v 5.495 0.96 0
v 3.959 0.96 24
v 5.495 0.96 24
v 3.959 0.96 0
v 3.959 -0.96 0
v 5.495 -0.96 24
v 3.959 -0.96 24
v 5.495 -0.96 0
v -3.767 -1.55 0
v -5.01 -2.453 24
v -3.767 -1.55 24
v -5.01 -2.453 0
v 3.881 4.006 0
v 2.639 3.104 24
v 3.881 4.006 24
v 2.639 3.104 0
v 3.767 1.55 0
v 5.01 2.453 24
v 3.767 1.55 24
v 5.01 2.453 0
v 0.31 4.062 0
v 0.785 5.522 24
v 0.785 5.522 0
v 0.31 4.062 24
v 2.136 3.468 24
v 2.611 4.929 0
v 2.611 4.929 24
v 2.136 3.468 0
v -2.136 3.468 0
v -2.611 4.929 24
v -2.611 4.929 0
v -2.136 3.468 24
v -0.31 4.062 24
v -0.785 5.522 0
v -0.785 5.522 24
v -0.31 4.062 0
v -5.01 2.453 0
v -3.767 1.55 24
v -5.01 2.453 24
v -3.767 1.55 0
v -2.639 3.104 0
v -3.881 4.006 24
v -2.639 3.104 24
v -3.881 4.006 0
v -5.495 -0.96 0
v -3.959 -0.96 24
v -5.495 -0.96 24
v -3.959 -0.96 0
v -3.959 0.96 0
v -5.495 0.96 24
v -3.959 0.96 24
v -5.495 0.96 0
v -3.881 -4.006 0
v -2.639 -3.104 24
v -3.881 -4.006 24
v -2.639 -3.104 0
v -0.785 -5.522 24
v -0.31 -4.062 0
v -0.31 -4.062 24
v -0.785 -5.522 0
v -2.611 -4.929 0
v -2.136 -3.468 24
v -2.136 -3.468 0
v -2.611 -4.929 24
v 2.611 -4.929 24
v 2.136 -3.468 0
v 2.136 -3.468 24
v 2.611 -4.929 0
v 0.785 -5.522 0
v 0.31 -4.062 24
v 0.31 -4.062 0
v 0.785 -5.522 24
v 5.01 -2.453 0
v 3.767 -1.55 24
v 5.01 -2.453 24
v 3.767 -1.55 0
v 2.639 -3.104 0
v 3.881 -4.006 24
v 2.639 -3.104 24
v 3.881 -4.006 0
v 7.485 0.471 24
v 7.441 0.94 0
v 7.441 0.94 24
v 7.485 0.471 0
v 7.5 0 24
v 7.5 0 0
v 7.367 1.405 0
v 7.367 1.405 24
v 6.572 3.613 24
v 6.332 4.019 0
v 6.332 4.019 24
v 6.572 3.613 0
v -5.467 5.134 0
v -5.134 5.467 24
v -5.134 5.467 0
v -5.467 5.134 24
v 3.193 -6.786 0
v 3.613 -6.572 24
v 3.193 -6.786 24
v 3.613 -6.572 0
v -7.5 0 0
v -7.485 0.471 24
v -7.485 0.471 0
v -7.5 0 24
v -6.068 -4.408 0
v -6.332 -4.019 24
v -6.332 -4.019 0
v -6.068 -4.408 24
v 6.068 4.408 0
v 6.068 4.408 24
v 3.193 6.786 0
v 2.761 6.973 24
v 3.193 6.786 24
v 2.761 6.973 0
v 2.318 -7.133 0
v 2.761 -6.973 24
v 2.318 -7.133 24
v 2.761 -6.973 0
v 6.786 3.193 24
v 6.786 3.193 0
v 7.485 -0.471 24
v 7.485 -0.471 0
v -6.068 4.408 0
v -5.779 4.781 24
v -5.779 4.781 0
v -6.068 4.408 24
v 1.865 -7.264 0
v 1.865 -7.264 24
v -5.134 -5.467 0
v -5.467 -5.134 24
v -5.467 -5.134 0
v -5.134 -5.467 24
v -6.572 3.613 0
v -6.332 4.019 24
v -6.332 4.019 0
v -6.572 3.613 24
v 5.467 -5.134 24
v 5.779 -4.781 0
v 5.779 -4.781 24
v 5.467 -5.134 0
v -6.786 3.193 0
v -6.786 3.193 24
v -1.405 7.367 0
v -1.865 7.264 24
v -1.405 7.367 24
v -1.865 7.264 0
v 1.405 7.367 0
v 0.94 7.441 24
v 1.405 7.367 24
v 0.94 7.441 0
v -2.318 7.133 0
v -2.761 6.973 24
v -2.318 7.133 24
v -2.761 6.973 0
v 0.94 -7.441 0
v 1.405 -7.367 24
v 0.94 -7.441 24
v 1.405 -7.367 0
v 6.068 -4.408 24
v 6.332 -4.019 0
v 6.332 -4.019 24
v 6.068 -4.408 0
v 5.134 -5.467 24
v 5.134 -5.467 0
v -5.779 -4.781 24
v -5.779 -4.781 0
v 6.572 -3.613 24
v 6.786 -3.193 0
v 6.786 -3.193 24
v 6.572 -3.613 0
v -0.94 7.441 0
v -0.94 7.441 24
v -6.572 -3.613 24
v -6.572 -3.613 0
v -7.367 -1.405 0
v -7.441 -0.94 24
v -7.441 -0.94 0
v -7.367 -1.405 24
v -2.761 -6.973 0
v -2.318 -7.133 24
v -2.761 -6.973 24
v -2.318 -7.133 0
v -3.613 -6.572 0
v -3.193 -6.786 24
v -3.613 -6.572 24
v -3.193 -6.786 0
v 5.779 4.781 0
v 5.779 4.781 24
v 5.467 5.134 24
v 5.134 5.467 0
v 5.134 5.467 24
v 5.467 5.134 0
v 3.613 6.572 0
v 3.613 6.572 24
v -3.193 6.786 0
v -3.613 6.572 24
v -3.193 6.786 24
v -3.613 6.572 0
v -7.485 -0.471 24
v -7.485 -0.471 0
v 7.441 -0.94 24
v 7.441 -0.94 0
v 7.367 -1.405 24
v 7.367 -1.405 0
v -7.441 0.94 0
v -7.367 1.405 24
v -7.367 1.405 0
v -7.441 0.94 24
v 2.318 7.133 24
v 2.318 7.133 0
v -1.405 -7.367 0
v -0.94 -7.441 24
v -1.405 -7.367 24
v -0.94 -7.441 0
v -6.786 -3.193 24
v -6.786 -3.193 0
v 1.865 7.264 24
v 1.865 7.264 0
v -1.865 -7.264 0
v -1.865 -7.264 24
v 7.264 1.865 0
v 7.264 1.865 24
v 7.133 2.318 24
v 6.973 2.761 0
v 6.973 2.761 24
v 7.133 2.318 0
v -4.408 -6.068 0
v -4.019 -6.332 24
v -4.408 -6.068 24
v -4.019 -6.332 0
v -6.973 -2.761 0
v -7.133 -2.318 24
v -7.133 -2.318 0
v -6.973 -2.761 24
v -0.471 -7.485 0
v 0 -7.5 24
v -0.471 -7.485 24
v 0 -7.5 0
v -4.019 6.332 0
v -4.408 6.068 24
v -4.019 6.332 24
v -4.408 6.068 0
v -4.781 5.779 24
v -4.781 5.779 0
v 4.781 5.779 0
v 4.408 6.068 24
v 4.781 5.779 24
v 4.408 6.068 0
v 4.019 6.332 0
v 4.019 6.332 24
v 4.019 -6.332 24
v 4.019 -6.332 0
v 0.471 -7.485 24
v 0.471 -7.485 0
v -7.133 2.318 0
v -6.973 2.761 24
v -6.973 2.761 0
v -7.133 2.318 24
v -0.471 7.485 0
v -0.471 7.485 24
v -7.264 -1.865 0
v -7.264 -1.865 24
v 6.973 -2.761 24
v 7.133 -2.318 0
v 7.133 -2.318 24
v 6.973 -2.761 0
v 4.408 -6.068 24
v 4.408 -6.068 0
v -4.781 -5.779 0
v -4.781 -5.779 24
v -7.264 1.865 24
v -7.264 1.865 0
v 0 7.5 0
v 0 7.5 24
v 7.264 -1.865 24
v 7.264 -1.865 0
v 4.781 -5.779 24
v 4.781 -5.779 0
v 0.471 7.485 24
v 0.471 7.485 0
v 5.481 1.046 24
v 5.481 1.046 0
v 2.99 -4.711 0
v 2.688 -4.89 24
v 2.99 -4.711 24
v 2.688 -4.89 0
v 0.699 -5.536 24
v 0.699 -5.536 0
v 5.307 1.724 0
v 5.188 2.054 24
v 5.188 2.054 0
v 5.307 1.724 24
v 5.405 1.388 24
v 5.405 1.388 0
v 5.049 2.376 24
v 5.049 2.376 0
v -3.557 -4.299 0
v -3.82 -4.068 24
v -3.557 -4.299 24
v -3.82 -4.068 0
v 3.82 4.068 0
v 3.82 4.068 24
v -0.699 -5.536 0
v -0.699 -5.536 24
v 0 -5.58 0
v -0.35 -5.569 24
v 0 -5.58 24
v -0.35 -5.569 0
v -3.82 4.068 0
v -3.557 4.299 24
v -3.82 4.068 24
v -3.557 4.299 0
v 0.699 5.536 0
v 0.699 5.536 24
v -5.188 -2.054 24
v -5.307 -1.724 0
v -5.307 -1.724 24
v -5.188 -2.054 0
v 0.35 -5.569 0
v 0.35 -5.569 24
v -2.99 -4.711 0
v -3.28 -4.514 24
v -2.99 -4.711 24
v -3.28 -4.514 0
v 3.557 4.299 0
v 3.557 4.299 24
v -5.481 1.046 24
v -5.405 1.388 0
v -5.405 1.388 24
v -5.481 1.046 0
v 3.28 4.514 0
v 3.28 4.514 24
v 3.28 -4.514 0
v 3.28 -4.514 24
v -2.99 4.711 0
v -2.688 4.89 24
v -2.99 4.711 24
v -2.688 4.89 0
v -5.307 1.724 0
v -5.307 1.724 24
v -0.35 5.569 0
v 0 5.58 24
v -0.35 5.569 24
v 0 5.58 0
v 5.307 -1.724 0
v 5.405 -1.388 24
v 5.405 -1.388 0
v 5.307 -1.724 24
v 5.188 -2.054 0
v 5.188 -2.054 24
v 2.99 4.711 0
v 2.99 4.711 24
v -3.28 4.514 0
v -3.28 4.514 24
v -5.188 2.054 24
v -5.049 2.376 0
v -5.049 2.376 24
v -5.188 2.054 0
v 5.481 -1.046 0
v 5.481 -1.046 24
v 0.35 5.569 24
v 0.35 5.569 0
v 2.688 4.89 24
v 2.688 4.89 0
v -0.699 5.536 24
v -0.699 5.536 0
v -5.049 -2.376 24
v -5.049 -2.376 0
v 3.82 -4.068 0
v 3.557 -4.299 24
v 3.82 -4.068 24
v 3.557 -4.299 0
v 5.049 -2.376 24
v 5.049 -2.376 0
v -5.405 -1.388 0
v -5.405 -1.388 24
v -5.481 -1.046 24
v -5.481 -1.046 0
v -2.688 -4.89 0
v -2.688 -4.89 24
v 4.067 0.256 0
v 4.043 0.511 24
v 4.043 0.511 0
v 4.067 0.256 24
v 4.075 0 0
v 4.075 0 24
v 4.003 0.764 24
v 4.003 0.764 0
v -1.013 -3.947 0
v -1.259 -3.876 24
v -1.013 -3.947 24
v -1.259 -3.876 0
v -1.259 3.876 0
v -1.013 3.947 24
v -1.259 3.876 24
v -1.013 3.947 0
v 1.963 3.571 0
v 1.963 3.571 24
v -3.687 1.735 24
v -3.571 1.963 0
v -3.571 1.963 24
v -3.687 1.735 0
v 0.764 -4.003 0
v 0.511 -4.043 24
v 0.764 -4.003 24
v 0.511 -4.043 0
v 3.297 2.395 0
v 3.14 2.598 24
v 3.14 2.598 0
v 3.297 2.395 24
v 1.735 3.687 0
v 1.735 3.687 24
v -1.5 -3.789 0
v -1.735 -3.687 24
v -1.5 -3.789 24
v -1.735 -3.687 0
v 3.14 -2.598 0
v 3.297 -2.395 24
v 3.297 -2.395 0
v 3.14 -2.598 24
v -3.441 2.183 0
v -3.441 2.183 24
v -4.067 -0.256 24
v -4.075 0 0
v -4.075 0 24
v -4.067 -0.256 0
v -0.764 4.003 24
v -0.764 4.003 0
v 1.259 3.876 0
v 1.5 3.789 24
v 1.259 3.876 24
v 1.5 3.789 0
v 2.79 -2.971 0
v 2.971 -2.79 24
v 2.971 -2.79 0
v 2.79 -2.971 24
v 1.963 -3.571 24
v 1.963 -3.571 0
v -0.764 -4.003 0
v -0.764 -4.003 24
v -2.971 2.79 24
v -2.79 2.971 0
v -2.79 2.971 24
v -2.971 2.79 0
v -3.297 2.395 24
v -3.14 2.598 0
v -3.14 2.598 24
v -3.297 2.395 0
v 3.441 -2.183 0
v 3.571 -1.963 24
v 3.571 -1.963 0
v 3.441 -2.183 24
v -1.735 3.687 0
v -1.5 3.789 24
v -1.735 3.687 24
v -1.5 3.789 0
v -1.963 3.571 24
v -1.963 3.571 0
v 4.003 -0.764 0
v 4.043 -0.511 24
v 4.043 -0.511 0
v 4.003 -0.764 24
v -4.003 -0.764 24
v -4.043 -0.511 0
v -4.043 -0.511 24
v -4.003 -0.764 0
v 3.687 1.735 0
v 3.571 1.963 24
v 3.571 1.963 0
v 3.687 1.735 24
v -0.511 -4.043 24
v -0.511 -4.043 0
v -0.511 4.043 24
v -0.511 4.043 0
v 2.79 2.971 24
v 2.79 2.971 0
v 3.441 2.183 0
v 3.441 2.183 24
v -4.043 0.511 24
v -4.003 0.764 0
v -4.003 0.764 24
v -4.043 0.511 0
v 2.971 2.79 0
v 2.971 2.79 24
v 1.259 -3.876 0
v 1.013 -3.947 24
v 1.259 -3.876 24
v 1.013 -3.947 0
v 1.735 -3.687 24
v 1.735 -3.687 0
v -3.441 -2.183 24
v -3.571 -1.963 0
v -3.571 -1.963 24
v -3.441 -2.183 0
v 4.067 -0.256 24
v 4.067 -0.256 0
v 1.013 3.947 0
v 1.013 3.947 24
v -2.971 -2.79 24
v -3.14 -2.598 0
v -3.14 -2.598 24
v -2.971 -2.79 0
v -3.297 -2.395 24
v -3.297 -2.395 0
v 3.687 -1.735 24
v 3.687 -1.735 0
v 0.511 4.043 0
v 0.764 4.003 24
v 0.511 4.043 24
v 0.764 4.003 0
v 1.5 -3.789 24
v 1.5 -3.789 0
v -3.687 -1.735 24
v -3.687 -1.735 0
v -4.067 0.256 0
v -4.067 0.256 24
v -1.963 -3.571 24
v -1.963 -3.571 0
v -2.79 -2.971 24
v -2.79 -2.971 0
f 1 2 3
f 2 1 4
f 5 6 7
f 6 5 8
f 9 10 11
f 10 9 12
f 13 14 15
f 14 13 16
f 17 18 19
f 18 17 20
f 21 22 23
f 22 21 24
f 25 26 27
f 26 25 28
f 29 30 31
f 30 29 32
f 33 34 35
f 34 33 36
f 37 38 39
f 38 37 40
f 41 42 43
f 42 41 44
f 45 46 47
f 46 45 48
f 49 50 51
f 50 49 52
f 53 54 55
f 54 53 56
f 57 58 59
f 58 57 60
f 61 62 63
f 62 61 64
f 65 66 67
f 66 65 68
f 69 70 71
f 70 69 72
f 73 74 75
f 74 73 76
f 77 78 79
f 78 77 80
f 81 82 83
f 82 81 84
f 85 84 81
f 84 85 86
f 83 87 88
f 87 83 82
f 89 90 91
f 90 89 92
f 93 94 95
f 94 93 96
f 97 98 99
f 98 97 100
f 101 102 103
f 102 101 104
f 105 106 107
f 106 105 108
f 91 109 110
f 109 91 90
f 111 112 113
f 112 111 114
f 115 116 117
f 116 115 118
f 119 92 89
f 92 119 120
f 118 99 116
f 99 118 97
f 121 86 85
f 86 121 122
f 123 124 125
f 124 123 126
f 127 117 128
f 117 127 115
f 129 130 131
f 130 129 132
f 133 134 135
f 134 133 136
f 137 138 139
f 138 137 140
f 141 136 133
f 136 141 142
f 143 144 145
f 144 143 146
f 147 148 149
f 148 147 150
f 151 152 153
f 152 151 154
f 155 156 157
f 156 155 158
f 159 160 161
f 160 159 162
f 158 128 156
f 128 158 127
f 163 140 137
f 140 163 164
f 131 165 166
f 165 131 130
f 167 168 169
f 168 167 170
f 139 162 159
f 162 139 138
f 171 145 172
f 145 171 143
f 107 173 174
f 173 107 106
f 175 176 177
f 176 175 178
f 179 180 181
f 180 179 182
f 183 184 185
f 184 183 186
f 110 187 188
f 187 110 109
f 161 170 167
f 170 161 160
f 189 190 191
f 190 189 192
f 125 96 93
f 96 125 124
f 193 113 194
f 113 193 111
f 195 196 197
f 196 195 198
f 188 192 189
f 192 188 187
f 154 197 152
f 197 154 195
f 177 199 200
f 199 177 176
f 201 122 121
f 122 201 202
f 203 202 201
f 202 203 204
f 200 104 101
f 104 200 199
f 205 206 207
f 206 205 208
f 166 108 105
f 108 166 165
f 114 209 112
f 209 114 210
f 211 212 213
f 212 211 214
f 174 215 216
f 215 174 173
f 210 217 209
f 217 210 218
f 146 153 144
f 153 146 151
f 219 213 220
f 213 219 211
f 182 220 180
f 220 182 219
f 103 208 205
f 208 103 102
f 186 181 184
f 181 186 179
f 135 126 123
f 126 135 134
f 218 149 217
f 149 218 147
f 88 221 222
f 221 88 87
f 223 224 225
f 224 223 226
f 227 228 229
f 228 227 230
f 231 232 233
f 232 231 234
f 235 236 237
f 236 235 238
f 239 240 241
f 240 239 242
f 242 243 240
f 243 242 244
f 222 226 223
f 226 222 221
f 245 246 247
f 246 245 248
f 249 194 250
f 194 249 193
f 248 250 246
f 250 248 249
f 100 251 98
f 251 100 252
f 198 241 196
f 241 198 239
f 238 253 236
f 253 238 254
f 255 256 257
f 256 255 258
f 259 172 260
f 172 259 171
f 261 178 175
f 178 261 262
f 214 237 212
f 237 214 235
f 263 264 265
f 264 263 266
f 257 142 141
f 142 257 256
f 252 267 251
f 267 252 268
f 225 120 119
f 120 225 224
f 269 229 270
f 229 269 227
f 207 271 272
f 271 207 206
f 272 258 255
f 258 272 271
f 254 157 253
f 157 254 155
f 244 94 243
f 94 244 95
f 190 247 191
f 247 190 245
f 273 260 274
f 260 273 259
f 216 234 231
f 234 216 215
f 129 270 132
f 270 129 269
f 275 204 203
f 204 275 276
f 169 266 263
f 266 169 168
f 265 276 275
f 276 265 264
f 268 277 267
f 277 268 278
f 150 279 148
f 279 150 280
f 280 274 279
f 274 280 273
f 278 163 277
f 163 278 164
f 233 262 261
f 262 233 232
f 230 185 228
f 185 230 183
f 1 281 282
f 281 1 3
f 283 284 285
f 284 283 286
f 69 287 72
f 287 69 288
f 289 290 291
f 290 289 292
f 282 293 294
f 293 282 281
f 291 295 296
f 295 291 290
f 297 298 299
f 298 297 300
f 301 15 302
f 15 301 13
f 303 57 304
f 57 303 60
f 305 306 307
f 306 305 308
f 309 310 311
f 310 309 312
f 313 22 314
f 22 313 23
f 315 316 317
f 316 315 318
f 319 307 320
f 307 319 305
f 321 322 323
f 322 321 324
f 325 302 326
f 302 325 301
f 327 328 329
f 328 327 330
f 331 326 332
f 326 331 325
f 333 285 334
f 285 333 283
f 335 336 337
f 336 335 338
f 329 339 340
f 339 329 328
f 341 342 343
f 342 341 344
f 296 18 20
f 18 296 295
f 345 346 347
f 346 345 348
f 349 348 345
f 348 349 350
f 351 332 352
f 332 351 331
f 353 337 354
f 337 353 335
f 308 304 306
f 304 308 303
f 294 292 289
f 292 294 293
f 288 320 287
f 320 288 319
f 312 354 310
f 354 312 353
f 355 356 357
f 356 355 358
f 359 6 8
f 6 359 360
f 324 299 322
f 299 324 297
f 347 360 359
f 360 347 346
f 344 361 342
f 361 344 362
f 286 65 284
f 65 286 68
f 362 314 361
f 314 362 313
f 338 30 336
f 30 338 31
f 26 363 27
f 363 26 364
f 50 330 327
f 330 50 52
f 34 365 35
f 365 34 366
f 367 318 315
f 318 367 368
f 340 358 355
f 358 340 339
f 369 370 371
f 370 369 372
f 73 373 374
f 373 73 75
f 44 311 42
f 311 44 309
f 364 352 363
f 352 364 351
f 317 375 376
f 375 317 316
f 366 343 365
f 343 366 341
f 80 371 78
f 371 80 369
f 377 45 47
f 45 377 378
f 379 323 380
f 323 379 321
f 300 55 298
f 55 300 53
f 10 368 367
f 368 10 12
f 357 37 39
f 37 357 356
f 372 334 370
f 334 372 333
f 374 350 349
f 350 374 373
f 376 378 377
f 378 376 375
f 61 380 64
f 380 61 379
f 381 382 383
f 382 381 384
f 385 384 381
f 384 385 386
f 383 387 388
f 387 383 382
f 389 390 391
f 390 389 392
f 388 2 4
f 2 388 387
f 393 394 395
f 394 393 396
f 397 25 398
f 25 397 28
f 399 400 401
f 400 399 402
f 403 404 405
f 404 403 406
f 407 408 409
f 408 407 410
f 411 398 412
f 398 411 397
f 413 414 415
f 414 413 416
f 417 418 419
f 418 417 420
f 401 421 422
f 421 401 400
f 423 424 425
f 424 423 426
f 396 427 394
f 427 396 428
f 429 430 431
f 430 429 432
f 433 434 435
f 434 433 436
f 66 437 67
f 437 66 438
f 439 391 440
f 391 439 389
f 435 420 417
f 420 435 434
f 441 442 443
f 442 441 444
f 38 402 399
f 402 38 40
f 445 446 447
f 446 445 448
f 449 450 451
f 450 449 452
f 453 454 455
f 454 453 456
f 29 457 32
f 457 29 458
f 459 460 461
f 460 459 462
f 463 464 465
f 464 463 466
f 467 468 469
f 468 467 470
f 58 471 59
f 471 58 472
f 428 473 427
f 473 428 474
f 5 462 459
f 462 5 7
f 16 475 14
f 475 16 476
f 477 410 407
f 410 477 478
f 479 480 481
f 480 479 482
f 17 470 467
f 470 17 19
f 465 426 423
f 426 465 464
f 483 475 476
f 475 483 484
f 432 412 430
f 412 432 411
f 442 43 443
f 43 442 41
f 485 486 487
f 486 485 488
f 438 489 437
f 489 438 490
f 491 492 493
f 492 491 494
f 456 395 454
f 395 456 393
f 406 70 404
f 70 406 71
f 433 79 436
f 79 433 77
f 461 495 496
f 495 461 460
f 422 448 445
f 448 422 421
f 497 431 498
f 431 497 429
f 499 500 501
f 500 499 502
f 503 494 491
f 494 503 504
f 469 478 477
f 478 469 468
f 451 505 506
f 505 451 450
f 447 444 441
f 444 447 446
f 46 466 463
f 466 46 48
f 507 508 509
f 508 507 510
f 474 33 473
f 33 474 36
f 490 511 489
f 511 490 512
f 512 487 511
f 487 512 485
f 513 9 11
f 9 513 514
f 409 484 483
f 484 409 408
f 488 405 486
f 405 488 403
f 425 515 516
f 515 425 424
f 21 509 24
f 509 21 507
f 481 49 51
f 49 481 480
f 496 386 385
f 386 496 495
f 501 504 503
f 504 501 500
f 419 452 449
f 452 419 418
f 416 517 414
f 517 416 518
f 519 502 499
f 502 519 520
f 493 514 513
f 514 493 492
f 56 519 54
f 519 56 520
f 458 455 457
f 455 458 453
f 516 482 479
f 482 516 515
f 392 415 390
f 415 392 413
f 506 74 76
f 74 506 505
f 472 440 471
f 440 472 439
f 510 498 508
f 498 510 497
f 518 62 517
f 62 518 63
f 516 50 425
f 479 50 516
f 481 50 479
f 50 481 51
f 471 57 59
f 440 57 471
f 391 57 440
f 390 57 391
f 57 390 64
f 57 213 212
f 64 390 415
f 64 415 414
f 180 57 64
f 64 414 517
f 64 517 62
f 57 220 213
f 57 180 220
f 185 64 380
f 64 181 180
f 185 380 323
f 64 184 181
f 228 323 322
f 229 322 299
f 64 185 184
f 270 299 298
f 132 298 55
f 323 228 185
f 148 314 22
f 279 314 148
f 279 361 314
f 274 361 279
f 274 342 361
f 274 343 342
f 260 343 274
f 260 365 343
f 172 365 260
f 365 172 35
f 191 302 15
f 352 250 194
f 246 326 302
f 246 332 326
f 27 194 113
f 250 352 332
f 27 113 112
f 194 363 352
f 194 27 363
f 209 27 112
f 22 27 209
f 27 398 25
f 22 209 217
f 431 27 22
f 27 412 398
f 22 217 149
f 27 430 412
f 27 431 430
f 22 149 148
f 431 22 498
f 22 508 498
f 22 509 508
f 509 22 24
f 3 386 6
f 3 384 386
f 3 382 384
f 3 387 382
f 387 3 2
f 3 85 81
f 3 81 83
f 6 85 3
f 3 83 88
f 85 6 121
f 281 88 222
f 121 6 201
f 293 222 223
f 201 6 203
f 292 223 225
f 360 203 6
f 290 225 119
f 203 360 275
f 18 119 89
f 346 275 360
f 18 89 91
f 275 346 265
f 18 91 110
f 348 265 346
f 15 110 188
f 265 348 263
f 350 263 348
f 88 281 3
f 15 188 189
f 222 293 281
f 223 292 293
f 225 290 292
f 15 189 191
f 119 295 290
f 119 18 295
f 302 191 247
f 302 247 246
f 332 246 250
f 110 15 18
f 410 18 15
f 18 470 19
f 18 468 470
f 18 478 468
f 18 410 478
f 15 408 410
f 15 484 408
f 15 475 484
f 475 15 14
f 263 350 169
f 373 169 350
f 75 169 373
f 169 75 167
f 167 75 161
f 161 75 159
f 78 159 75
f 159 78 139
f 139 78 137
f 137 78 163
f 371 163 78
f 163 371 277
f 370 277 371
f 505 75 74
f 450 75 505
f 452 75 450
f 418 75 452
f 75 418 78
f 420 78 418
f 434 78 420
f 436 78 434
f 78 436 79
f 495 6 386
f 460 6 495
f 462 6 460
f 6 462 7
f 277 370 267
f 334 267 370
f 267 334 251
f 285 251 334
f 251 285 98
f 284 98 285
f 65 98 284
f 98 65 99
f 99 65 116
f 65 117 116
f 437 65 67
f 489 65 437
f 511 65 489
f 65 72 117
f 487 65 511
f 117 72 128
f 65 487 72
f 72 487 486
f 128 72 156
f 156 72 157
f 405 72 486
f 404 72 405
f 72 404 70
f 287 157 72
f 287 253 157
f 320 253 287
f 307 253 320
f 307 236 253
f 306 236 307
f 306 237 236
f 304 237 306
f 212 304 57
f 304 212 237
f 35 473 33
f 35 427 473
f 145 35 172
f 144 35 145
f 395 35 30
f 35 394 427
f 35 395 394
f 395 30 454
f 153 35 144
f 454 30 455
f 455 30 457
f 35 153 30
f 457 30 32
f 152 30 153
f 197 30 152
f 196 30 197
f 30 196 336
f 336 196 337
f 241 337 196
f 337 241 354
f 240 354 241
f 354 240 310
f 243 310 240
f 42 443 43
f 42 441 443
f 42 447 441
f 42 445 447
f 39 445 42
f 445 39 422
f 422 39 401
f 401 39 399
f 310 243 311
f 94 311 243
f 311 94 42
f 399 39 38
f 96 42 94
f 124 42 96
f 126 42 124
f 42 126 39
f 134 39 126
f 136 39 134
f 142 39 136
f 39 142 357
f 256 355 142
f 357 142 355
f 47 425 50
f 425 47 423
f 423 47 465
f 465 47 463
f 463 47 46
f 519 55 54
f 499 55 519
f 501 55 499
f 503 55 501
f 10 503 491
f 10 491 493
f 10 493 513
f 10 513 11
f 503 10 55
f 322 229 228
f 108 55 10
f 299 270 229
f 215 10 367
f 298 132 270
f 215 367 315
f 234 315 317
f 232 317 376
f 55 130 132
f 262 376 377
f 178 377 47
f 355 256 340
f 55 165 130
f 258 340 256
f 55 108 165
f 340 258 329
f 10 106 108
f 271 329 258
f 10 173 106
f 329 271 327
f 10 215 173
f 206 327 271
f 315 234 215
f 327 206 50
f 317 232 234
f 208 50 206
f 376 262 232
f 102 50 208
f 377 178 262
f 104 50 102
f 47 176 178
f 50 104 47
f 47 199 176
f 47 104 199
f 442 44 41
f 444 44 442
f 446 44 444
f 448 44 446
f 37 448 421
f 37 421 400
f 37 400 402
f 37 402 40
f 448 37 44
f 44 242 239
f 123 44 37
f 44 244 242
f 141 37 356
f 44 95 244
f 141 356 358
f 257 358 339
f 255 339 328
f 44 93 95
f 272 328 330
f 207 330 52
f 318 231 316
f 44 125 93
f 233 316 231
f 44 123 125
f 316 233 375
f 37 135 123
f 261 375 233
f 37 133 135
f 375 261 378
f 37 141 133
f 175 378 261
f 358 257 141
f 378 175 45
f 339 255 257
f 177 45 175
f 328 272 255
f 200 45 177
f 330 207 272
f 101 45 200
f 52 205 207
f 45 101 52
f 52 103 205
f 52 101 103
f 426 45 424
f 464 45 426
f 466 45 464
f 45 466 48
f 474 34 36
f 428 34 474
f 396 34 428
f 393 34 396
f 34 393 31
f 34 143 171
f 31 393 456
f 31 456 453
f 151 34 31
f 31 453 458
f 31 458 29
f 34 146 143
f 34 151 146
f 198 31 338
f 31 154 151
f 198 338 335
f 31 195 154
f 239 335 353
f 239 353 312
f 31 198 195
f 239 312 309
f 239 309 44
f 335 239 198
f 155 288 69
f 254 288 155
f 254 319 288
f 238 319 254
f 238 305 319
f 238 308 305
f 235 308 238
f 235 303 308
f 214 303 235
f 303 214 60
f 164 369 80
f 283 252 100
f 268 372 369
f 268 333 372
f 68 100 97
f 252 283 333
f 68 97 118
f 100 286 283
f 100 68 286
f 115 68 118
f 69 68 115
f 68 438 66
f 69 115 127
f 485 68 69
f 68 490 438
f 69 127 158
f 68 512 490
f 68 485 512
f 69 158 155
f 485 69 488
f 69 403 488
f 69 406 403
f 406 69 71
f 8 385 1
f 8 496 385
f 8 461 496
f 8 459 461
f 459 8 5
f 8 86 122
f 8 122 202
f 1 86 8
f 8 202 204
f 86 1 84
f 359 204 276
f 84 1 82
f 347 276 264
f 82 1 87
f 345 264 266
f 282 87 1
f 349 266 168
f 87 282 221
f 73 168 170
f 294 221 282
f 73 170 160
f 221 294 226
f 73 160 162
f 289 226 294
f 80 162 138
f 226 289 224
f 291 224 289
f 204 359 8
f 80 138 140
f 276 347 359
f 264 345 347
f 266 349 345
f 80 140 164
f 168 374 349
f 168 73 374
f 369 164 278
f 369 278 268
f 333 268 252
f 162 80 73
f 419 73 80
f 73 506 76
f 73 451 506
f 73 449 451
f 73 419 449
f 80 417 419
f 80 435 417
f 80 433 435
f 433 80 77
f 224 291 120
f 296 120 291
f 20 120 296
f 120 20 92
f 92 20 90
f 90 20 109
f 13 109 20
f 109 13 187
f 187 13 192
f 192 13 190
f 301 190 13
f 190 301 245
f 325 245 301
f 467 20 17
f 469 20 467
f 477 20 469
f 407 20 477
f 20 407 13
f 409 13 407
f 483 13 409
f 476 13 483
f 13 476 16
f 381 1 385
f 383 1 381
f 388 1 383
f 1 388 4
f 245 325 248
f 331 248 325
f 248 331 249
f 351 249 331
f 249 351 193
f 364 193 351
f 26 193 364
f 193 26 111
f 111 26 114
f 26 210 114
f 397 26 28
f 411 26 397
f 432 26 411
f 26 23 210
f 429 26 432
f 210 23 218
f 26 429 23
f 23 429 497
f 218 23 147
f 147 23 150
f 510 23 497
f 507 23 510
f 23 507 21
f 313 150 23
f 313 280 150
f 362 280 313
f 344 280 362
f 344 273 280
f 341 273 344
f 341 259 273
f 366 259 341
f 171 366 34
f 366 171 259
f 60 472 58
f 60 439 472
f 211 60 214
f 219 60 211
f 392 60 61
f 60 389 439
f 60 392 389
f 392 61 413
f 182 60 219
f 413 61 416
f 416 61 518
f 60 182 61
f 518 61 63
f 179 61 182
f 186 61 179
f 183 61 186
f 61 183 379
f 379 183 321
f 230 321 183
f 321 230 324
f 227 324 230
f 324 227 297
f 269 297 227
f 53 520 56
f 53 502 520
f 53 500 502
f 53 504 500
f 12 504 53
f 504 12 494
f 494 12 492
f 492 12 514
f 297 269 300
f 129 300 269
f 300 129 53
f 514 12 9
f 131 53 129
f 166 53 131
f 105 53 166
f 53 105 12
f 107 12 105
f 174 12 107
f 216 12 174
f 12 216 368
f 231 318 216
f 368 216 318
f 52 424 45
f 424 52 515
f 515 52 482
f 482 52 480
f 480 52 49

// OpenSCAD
 /*
 * Customizable Linear Bushing - https://www.thingiverse.com/thing:2202854
 * by Dennis Hofmann - https://www.thingiverse.com/mightynozzle/about
 * created 2017-03-25
 * updated 2018-02-15
 * version v1.8
 *
 * Changelog
 * --------------
 * v1.8:
 *      - groove option added
 * v1.7:
 *      - fixed inner diameter
 * v1.6:
 *      - added chamfer angle option
 * v1.5:
 *      - fixed graphic glitch
 * v1.4:
 *      - added chamfer option
 *
 * v1.1-1.3:
 *      - initial model with minor changes in description
 *
 * --------------
 * 
 * This work is licensed under the Creative Commons - Attribution - Non-Commercial license.
 * https://creativecommons.org/licenses/by-nc/3.0/
 */
 
 // Parameter Section //
//-------------------//

/* [Bushing Settings] */

// Equals dr in technical diagrams. Use the outer diameter of the rod + tolerance value of your printer. Do some test prints before print a whole set of bushings. Best way in my case is to choose the bushing where can push it in with some effort on the rod and slide it by hand without any tools. Then slide it back and forth along the rod, until the bushing has the expected behavior. I suggest you not to use any drill or heat. The sliding of the bushing generates enough heat from its friction against the rod. Standard values: 6.00 for LM6(L)UU, 8.00 (default 8.15) for LM8(L)UU, 10.00 for LM10(L)UU, 12.00 for LM12(L)UU, 16.00 for LM16UU, ...
inner_diameter_in_millimeter = 8.15;

// Equals D in technical diagrams. Use the inner diameter of housing where the bushing sits + tolerance value of your printer. Depends on the filament you use and the total wall thickness of the bushings, the bushing shouldn't fit to tight in the housing. Standard values: 12.0 for LM6(L)UU, 15.0 (default) for LM8(L)UU, 19.0 for LM10(L)UU, 21.0 for LM12(L)UU, 28.0 for LM16UU, ...
outer_diameter_in_millimeter = 15.0; 

// Equals L in technical diagrams. Standard values: 19.0 for LM6UU, 24.0 for LM8UU, 29.0 for LM10UU, 30.0 for LM12UU, 35.0 for LM6LUU, 37.0 for LM16UU, 45.0 for LM8LUU, 55.0 for LM10LUU, 57.0 for LM12LUU, ...
bushing_length_in_millimeter = 24.0;

// Use a value to get straight primeters without any zigzag between the outer and inner perimeter. I use the value of 0.48 for 0.4 nozzle. This is the auto extrusion width of 0.48 of simplify3d. More information about this in the description of this design on thingiverse.
extrusion_width_in_millimeter = 0.48; 

// Use even numbers. E.g. 4 for LM8(L)UU. Don't forget to set the perimeter number in your Slicer! 
number_of_perimeters = 4; //[2:2:10]

// Choose a number to provide a gap between the teeth in the bushing. E.g. 8 or 10 for LM8(L)UU. The tooth width depends on the extrusion_width_in_millimeter and the number_of_perimeters.
number_of_teeth = 10; //[3:20]

// Radius of the chamfer. Set a chamfer if you want to insert the rod easier. This also helps if your prints tends to create elephant foot in the first few layers. A value between 0.3 and 1.0 might be a good value. Set a value above 0 might destroy the preview of the bushing. But the resulting stl-File will be correct.
chamfer_radius_in_millimeter = 0.0;

// Set the angle of the chamfer. 
chamfer_angle_in_degree = 55.0; // [30:75]

// Equals W in technical diagram. 1.1 for LM6/8(L)UU, 1.3 for LM10/12/13(L)UU, 1.6 for LM16/20(L)UU, 1.85 for LM25/30(L)UU, 2.1 for LM35/40(L)UU, 2.6 for LM50(L)UU, 3.15 for LM60(L)UU
groove_length_in_millimeter = 0;

// Equals D1 in technical diagram. 11.5 for LM6(L)UU, 14.3 for LM8(L)UU, 18.0 for LM10(L)UU, 20.0 for LM12(L)UU, 22.0 for LM13(L)UU, 27.0 for LM16(L)UU, 30.5 for LM20(L)UU, 38.0 for LM25(L)UU, 43.0 for LM30(L)UU, 49.0 for LM35(L)UU, 57.0 for LM40(L)UU, 76.5 for LM50(L)UU, 86.5 for LM60(L)UU
groove_diameter_in_millimeter = 0;

// Equals B in technical diagram. Outer distance between both grooves. 13.5 for LM6UU, 17.5 for LM8UU, 22.0 for LM10UU, 23.0 for LM12UU, 26.5 for LM16UU, 27.0 for LM6LUU, 35.0 for LM8UU, 44.0 for LM10LUU, 46.0 for LM12LUU, 53.0 for LM16LUU
groove_distance_in_millimeter = 0;

/* [Hidden] */
inner_dia = inner_diameter_in_millimeter;
outer_dia = outer_diameter_in_millimeter;
bushing_l = bushing_length_in_millimeter;
extrusion_w = extrusion_width_in_millimeter;
perimeters = number_of_perimeters;
teeth = number_of_teeth;
chamfer_r = chamfer_radius_in_millimeter;
chamfer_h = tan(chamfer_angle_in_degree) * chamfer_r;
groove_l = groove_length_in_millimeter;
groove_dia = groove_diameter_in_millimeter;
groove_d = groove_distance_in_millimeter;


$fn=100;

 // Program Section //
//-----------------//

color("HotPink") difference() {
    bushing();
    if(chamfer_r > 0) {
        chamfer_cut();
        translate([0, 0, bushing_l]) {
            rotate([180,0,0]) {
                chamfer_cut();
            }
        }
    }
    groove_cut();
}


 // Module Section //
//----------------//

module bushing() {
    translate([0, 0, bushing_l / 2]) {
        difference() {
            union() {
                difference() {
                    for(tooth = [0 : teeth - 1])
                        rotate([0, 0, 360 / teeth * tooth]) {
                            translate([outer_dia / 4, 0, 0]) {
                                cube([outer_dia / 2, extrusion_w * perimeters, bushing_l + 1], center = true);
                            }
                        }
                        translate([0, 0, -bushing_l / 2-1]) {
                            ring(outer_dia * 2, outer_dia, bushing_l + 2);
                        }
                    }
                    translate([0, 0, -bushing_l / 2 - 1]) {
                        ring(outer_dia, outer_dia - extrusion_w * perimeters * 2, bushing_l + 2);
                    }
            }
            cylinder(d = inner_dia, h = bushing_l + 2, center = true);
            translate([0, 0, bushing_l / 2]) {
                cylinder(d = outer_dia + 1, h = 2, $f = 16);
            }
            translate([0, 0, -(bushing_l / 2 + 2)]) {
                cylinder(d = outer_dia + 1, h = 2, $f = 16);
            }
        }
    }
}

module ring(d1, d2, height) {
    difference() {
        cylinder(d = d1, h = height, center = false);
        cylinder(d = d2, h = height, center = false);
    }
}

module chamfer_cut() {
    union() {
        difference() {
            translate([0, 0, -1]) {
                cylinder(d = outer_dia + 1, h = chamfer_h + 1);
            }
            intersection() {
                cylinder(d = outer_dia, h = chamfer_h);
                cylinder(d1 = outer_dia - chamfer_r * 2, d2 = outer_dia, h = chamfer_h);
            }
        }
        translate([0, 0, -chamfer_h]) {
            intersection() {
                cylinder(d = inner_dia + chamfer_r * 4, h = chamfer_h * 2);
                cylinder(d1 = inner_dia + chamfer_r * 4, d2 = inner_dia, h = chamfer_h * 2);
            }
        }
        translate([0, 0, -10]) {
            cylinder(d = outer_dia + 1, h = 10);
        }
    }
}

module groove_cut() {
    translate([0, 0, bushing_l / 2 - groove_d / 2]) {
        ring(outer_dia + 1, groove_dia, groove_l);
    }
    translate([0, 0, bushing_l - ((bushing_l / 2) - (groove_d / 2) + groove_l)]) {
        ring(outer_dia + 1, groove_dia, groove_l);
    }
}
